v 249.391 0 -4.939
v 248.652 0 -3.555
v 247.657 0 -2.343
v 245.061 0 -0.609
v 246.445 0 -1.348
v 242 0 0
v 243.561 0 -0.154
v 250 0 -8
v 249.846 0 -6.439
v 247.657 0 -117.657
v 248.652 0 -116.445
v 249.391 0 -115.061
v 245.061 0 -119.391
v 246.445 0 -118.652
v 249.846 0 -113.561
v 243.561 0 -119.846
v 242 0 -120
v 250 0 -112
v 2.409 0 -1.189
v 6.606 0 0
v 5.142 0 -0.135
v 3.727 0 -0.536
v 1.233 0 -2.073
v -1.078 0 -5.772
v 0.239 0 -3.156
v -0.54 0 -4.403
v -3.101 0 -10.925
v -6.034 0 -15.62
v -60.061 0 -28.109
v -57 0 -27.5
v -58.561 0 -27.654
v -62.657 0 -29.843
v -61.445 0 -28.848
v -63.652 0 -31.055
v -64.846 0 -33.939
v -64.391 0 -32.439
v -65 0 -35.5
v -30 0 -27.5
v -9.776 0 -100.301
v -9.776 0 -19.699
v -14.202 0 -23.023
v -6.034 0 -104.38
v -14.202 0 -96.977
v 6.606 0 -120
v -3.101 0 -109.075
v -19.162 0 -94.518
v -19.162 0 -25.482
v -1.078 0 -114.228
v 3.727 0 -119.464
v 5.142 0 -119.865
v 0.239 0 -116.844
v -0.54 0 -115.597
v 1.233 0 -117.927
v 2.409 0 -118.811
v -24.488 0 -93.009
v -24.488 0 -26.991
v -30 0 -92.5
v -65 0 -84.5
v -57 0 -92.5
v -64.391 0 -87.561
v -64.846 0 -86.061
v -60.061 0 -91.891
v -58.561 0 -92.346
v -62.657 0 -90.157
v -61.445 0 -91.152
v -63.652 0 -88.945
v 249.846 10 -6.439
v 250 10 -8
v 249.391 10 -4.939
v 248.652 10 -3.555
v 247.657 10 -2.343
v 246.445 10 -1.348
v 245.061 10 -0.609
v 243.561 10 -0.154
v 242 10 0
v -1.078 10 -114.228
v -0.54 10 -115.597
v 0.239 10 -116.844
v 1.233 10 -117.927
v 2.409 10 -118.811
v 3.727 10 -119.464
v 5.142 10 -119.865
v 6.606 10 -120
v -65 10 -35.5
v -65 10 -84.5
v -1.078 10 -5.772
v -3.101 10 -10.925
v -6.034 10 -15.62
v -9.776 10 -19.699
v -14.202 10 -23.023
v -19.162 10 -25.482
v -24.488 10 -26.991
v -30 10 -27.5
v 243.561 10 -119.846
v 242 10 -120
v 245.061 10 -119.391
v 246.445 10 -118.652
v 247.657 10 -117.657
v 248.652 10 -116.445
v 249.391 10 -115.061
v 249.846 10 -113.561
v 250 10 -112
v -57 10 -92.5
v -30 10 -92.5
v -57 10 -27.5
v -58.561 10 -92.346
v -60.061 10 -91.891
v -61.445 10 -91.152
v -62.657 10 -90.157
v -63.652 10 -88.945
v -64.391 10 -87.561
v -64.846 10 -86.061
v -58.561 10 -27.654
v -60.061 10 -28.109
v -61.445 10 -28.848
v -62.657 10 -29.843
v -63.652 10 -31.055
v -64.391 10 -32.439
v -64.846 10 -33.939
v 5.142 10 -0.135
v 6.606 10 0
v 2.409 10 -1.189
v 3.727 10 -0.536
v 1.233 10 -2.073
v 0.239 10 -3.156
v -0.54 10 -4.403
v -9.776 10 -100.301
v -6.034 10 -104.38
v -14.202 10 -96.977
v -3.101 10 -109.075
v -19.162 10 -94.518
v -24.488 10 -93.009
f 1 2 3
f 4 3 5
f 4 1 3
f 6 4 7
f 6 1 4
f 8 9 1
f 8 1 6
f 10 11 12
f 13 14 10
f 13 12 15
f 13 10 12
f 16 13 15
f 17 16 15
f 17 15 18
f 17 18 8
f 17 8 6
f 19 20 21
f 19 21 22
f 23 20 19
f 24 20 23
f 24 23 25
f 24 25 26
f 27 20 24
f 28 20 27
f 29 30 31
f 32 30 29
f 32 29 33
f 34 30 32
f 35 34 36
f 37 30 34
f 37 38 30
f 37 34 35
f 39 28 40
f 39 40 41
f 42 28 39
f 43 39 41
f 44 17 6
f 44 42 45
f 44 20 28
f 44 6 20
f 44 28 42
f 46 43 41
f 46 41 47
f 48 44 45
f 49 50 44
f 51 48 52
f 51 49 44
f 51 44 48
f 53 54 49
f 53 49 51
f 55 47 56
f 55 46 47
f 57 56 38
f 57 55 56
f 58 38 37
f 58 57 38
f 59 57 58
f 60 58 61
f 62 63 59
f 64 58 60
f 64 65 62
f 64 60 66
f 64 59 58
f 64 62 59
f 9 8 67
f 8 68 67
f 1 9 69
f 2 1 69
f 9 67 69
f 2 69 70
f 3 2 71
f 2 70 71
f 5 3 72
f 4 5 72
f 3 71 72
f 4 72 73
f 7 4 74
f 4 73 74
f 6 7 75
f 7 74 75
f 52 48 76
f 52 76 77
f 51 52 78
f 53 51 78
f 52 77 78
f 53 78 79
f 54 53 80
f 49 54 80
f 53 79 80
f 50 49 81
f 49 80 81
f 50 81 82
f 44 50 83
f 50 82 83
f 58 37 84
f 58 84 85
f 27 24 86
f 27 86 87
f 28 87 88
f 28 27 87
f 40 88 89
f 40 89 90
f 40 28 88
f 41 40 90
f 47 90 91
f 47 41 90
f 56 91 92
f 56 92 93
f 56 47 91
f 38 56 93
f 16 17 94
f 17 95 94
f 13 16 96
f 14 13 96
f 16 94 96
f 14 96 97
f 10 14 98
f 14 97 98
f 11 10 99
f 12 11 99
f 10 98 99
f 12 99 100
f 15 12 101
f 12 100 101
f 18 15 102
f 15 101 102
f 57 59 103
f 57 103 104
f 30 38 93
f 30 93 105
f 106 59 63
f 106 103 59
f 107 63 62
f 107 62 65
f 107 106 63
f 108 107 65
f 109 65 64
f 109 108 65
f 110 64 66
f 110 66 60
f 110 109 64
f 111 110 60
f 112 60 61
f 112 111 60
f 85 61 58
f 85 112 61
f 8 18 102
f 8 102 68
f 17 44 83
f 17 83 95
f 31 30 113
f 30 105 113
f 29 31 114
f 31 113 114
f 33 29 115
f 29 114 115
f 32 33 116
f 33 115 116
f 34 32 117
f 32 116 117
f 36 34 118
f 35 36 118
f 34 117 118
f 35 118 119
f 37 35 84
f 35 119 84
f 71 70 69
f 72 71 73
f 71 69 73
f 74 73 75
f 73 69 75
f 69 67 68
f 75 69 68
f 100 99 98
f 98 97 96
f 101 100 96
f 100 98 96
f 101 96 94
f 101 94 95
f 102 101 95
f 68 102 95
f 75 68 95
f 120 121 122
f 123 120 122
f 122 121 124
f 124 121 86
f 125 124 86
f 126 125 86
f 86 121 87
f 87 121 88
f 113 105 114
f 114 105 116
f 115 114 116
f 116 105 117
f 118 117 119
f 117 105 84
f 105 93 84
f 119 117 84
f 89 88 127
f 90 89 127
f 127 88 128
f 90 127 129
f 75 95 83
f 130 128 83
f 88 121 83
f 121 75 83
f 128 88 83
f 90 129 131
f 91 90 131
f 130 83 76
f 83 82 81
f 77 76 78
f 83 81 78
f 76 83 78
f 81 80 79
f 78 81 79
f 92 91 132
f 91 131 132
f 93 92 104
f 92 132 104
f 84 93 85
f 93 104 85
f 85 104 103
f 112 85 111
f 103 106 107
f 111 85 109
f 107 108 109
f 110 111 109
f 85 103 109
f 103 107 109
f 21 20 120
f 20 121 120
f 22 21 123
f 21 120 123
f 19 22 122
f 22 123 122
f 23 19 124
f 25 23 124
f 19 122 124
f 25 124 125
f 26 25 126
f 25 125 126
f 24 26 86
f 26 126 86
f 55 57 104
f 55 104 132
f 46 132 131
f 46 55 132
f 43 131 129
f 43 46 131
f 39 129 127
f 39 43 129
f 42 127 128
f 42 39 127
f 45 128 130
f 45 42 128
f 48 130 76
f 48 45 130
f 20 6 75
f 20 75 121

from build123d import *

# Parameters (mm, degrees)
BOSS_EXTRUDE1_DEPTH = 10
FILLET1_R           = 8


with BuildPart() as part:
    # Sketch1 → Boss-Extrude1 (new body)
    with BuildSketch(Plane(origin=(0, 0, 0), x_dir=(1, 0, 0), z_dir=(0, 1, 0))):
        with BuildLine():
            Line((-65, 92.5), (-30, 92.5))
            ThreePointArc((-30, 92.5), (-9.651474255, 100.415244642), (0, 120))
            Line((0, 120), (250, 120))
            Line((250, 120), (250, 0))
            Line((250, 0), (0, 0))
            ThreePointArc((0, 0), (-9.651474255, 19.584755358), (-30, 27.5))
            Line((-30, 27.5), (-65, 27.5))
            Line((-65, 27.5), (-65, 92.5))
        make_face()
    extrude(amount=BOSS_EXTRUDE1_DEPTH)

    # Fillet1
    fillet1_edges = [part.edges().sort_by_distance(p)[0] for p in [
        (-65, 5, -92.5),
        (0, 5, -120),
        (250, 5, -120),
        (250, 5, 0),
        (0, 5, 0),
        (-65, 5, -27.5),
    ]]
    fillet(fillet1_edges, radius=FILLET1_R)


solid = part.part
